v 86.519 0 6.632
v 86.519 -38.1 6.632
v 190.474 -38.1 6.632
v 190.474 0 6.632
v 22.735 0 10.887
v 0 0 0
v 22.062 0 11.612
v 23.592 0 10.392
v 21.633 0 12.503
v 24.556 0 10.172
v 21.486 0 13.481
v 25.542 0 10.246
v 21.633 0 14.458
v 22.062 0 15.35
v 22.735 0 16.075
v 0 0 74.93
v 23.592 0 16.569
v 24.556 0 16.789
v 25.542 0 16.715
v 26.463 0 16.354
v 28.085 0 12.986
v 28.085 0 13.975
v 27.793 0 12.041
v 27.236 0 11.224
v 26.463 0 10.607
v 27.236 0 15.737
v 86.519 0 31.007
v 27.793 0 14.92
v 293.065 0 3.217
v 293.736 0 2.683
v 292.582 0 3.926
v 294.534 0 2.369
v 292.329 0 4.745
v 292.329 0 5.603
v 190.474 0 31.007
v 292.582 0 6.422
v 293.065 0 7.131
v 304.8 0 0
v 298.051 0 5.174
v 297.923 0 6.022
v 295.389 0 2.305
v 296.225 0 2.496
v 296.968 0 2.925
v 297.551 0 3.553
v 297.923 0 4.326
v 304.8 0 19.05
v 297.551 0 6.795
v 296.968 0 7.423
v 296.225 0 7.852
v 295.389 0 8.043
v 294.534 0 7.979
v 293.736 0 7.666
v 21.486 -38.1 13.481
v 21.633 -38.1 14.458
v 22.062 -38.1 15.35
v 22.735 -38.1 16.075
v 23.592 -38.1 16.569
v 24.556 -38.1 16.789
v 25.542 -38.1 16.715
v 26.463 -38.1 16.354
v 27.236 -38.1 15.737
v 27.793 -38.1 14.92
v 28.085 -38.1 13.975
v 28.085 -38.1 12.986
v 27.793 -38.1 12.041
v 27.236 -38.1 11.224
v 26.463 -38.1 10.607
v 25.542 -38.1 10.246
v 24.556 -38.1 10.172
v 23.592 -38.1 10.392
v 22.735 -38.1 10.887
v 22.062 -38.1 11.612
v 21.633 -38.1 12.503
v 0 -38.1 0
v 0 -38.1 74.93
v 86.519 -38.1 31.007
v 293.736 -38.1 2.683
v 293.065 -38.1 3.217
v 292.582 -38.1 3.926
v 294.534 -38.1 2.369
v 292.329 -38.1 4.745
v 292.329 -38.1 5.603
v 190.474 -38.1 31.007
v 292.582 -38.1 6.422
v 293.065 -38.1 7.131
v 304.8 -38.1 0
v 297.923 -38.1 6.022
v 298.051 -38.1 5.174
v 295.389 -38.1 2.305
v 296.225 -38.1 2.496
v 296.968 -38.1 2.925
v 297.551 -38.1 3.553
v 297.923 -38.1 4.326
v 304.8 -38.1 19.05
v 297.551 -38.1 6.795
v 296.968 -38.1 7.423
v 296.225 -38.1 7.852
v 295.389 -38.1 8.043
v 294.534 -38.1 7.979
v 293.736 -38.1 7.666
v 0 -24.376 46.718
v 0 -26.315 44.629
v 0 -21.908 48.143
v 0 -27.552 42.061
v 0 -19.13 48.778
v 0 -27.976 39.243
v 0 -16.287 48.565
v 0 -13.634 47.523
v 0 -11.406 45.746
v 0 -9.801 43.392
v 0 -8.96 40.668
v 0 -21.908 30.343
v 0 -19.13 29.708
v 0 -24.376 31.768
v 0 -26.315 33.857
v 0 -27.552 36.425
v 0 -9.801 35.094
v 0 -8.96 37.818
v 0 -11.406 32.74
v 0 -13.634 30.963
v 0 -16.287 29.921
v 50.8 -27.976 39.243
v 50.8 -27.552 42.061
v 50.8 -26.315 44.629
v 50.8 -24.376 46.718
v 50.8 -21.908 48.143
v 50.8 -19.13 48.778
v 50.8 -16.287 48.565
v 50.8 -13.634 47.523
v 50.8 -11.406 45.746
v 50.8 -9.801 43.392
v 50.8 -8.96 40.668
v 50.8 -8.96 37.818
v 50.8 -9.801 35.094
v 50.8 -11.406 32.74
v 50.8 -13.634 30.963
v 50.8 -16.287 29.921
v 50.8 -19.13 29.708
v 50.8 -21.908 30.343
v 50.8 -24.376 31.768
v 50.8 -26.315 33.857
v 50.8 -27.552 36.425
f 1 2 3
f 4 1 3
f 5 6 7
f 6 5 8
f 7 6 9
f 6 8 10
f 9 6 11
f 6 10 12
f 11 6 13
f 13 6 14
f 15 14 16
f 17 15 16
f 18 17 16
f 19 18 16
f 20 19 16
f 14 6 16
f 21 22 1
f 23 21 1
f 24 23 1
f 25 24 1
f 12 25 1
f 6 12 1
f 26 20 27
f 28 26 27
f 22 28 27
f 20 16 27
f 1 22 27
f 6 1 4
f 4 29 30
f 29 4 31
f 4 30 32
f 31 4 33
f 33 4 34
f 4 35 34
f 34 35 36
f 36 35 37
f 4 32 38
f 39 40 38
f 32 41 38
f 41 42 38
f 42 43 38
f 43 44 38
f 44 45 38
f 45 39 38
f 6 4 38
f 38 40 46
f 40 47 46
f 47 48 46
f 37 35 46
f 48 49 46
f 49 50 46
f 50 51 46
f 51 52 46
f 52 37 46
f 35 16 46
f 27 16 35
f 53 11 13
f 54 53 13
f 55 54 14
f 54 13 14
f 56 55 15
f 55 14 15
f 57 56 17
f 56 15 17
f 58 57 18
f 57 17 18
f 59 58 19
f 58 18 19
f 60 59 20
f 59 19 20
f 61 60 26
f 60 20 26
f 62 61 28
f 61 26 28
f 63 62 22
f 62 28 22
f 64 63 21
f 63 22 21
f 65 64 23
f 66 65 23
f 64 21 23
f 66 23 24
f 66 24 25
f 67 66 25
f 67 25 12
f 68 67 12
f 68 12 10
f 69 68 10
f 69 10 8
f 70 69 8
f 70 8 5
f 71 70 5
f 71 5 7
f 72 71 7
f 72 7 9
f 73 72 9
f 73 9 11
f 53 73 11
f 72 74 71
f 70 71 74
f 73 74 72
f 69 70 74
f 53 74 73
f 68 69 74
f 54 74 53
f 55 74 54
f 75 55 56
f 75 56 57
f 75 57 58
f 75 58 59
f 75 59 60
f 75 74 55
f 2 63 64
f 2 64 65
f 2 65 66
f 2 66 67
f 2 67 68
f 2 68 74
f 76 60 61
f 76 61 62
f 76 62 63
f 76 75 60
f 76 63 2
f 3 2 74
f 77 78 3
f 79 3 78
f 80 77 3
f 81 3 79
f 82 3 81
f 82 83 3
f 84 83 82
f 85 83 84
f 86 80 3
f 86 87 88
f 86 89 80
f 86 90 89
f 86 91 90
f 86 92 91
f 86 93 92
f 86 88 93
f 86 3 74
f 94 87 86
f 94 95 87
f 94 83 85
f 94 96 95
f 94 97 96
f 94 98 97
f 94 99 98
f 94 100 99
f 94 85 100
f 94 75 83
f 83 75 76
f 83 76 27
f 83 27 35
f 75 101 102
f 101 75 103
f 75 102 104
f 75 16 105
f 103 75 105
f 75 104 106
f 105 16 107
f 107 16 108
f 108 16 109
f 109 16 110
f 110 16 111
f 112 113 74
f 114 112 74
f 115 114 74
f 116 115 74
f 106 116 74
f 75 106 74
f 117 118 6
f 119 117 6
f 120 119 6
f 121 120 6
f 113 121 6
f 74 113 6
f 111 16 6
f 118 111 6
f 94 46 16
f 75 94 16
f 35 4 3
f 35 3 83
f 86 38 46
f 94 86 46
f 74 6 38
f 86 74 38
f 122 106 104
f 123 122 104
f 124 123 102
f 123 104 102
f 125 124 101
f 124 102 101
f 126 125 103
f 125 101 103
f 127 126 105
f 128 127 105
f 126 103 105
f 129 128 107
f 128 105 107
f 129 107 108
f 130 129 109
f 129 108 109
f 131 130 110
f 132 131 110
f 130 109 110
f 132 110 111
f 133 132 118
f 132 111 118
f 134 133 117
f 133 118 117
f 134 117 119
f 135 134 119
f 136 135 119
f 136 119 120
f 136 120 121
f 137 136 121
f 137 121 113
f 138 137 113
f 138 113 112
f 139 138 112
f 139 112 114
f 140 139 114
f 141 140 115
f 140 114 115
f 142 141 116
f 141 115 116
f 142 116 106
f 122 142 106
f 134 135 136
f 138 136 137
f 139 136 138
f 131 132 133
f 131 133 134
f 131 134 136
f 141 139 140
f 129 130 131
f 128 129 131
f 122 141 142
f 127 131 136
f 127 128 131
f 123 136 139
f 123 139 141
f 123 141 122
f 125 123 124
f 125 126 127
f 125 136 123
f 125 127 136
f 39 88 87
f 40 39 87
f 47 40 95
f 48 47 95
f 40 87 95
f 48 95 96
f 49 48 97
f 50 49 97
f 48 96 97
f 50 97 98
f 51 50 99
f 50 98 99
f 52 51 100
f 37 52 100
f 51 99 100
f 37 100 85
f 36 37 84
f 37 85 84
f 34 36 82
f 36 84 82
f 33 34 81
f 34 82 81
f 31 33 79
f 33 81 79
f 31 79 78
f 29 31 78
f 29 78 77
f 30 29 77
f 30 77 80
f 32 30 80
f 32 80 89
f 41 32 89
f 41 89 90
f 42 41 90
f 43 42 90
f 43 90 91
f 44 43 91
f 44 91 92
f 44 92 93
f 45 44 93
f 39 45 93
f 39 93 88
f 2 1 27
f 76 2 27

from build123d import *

# Parameters (mm, degrees)
F1_DEPTH = 38.1
F2_R     = 9.561336
F3_DEPTH = 50.8
F4_R     = 3.317837
F5_DEPTH = 42.926
F6_W     = 103.955641
F6_H     = 24.375808
F7_DEPTH = 50.8
F8_R     = 2.876859
F9_DEPTH = 45.212


with BuildPart() as f1:
    # F0 (on Front) → F1 (new body)
    with BuildSketch(Plane.XZ):
        Polygon((0, 74.93), (0, 0), (304.8, 0), (304.8, 19.05), align=None)
    extrude(amount=F1_DEPTH)

    # F2 (on face) → F3 (cut)
    with BuildSketch(Plane(origin=(0, 0, 0), x_dir=(0, -1, 0), z_dir=(-1, 0, 0))):
        with Locations((18.415, 39.243001)):
            Circle(F2_R)
    extrude(amount=-F3_DEPTH, mode=Mode.SUBTRACT)

    # F4 (on face) → F5 (cut)
    with BuildSketch(Plane(origin=(0, 0, 0), x_dir=(-1, 0, 0), z_dir=(0, 1, 0))):
        with Locations((-24.803754, 13.480514)):
            Circle(F4_R)
    extrude(amount=-F5_DEPTH, mode=Mode.SUBTRACT)

    # F6 (on face) → F7 (cut)
    with BuildSketch(Plane.XZ.offset(38.1)):
        with Locations((138.49657, 18.819557)):
            Rectangle(F6_W, F6_H)
    extrude(amount=-F7_DEPTH, mode=Mode.SUBTRACT)

    # F8 (on face) → F9 (cut)
    with BuildSketch(Plane.XZ.offset(38.1)):
        with Locations((295.173943, 5.17409)):
            Circle(F8_R)
    extrude(amount=-F9_DEPTH, mode=Mode.SUBTRACT)


solid = f1.part
